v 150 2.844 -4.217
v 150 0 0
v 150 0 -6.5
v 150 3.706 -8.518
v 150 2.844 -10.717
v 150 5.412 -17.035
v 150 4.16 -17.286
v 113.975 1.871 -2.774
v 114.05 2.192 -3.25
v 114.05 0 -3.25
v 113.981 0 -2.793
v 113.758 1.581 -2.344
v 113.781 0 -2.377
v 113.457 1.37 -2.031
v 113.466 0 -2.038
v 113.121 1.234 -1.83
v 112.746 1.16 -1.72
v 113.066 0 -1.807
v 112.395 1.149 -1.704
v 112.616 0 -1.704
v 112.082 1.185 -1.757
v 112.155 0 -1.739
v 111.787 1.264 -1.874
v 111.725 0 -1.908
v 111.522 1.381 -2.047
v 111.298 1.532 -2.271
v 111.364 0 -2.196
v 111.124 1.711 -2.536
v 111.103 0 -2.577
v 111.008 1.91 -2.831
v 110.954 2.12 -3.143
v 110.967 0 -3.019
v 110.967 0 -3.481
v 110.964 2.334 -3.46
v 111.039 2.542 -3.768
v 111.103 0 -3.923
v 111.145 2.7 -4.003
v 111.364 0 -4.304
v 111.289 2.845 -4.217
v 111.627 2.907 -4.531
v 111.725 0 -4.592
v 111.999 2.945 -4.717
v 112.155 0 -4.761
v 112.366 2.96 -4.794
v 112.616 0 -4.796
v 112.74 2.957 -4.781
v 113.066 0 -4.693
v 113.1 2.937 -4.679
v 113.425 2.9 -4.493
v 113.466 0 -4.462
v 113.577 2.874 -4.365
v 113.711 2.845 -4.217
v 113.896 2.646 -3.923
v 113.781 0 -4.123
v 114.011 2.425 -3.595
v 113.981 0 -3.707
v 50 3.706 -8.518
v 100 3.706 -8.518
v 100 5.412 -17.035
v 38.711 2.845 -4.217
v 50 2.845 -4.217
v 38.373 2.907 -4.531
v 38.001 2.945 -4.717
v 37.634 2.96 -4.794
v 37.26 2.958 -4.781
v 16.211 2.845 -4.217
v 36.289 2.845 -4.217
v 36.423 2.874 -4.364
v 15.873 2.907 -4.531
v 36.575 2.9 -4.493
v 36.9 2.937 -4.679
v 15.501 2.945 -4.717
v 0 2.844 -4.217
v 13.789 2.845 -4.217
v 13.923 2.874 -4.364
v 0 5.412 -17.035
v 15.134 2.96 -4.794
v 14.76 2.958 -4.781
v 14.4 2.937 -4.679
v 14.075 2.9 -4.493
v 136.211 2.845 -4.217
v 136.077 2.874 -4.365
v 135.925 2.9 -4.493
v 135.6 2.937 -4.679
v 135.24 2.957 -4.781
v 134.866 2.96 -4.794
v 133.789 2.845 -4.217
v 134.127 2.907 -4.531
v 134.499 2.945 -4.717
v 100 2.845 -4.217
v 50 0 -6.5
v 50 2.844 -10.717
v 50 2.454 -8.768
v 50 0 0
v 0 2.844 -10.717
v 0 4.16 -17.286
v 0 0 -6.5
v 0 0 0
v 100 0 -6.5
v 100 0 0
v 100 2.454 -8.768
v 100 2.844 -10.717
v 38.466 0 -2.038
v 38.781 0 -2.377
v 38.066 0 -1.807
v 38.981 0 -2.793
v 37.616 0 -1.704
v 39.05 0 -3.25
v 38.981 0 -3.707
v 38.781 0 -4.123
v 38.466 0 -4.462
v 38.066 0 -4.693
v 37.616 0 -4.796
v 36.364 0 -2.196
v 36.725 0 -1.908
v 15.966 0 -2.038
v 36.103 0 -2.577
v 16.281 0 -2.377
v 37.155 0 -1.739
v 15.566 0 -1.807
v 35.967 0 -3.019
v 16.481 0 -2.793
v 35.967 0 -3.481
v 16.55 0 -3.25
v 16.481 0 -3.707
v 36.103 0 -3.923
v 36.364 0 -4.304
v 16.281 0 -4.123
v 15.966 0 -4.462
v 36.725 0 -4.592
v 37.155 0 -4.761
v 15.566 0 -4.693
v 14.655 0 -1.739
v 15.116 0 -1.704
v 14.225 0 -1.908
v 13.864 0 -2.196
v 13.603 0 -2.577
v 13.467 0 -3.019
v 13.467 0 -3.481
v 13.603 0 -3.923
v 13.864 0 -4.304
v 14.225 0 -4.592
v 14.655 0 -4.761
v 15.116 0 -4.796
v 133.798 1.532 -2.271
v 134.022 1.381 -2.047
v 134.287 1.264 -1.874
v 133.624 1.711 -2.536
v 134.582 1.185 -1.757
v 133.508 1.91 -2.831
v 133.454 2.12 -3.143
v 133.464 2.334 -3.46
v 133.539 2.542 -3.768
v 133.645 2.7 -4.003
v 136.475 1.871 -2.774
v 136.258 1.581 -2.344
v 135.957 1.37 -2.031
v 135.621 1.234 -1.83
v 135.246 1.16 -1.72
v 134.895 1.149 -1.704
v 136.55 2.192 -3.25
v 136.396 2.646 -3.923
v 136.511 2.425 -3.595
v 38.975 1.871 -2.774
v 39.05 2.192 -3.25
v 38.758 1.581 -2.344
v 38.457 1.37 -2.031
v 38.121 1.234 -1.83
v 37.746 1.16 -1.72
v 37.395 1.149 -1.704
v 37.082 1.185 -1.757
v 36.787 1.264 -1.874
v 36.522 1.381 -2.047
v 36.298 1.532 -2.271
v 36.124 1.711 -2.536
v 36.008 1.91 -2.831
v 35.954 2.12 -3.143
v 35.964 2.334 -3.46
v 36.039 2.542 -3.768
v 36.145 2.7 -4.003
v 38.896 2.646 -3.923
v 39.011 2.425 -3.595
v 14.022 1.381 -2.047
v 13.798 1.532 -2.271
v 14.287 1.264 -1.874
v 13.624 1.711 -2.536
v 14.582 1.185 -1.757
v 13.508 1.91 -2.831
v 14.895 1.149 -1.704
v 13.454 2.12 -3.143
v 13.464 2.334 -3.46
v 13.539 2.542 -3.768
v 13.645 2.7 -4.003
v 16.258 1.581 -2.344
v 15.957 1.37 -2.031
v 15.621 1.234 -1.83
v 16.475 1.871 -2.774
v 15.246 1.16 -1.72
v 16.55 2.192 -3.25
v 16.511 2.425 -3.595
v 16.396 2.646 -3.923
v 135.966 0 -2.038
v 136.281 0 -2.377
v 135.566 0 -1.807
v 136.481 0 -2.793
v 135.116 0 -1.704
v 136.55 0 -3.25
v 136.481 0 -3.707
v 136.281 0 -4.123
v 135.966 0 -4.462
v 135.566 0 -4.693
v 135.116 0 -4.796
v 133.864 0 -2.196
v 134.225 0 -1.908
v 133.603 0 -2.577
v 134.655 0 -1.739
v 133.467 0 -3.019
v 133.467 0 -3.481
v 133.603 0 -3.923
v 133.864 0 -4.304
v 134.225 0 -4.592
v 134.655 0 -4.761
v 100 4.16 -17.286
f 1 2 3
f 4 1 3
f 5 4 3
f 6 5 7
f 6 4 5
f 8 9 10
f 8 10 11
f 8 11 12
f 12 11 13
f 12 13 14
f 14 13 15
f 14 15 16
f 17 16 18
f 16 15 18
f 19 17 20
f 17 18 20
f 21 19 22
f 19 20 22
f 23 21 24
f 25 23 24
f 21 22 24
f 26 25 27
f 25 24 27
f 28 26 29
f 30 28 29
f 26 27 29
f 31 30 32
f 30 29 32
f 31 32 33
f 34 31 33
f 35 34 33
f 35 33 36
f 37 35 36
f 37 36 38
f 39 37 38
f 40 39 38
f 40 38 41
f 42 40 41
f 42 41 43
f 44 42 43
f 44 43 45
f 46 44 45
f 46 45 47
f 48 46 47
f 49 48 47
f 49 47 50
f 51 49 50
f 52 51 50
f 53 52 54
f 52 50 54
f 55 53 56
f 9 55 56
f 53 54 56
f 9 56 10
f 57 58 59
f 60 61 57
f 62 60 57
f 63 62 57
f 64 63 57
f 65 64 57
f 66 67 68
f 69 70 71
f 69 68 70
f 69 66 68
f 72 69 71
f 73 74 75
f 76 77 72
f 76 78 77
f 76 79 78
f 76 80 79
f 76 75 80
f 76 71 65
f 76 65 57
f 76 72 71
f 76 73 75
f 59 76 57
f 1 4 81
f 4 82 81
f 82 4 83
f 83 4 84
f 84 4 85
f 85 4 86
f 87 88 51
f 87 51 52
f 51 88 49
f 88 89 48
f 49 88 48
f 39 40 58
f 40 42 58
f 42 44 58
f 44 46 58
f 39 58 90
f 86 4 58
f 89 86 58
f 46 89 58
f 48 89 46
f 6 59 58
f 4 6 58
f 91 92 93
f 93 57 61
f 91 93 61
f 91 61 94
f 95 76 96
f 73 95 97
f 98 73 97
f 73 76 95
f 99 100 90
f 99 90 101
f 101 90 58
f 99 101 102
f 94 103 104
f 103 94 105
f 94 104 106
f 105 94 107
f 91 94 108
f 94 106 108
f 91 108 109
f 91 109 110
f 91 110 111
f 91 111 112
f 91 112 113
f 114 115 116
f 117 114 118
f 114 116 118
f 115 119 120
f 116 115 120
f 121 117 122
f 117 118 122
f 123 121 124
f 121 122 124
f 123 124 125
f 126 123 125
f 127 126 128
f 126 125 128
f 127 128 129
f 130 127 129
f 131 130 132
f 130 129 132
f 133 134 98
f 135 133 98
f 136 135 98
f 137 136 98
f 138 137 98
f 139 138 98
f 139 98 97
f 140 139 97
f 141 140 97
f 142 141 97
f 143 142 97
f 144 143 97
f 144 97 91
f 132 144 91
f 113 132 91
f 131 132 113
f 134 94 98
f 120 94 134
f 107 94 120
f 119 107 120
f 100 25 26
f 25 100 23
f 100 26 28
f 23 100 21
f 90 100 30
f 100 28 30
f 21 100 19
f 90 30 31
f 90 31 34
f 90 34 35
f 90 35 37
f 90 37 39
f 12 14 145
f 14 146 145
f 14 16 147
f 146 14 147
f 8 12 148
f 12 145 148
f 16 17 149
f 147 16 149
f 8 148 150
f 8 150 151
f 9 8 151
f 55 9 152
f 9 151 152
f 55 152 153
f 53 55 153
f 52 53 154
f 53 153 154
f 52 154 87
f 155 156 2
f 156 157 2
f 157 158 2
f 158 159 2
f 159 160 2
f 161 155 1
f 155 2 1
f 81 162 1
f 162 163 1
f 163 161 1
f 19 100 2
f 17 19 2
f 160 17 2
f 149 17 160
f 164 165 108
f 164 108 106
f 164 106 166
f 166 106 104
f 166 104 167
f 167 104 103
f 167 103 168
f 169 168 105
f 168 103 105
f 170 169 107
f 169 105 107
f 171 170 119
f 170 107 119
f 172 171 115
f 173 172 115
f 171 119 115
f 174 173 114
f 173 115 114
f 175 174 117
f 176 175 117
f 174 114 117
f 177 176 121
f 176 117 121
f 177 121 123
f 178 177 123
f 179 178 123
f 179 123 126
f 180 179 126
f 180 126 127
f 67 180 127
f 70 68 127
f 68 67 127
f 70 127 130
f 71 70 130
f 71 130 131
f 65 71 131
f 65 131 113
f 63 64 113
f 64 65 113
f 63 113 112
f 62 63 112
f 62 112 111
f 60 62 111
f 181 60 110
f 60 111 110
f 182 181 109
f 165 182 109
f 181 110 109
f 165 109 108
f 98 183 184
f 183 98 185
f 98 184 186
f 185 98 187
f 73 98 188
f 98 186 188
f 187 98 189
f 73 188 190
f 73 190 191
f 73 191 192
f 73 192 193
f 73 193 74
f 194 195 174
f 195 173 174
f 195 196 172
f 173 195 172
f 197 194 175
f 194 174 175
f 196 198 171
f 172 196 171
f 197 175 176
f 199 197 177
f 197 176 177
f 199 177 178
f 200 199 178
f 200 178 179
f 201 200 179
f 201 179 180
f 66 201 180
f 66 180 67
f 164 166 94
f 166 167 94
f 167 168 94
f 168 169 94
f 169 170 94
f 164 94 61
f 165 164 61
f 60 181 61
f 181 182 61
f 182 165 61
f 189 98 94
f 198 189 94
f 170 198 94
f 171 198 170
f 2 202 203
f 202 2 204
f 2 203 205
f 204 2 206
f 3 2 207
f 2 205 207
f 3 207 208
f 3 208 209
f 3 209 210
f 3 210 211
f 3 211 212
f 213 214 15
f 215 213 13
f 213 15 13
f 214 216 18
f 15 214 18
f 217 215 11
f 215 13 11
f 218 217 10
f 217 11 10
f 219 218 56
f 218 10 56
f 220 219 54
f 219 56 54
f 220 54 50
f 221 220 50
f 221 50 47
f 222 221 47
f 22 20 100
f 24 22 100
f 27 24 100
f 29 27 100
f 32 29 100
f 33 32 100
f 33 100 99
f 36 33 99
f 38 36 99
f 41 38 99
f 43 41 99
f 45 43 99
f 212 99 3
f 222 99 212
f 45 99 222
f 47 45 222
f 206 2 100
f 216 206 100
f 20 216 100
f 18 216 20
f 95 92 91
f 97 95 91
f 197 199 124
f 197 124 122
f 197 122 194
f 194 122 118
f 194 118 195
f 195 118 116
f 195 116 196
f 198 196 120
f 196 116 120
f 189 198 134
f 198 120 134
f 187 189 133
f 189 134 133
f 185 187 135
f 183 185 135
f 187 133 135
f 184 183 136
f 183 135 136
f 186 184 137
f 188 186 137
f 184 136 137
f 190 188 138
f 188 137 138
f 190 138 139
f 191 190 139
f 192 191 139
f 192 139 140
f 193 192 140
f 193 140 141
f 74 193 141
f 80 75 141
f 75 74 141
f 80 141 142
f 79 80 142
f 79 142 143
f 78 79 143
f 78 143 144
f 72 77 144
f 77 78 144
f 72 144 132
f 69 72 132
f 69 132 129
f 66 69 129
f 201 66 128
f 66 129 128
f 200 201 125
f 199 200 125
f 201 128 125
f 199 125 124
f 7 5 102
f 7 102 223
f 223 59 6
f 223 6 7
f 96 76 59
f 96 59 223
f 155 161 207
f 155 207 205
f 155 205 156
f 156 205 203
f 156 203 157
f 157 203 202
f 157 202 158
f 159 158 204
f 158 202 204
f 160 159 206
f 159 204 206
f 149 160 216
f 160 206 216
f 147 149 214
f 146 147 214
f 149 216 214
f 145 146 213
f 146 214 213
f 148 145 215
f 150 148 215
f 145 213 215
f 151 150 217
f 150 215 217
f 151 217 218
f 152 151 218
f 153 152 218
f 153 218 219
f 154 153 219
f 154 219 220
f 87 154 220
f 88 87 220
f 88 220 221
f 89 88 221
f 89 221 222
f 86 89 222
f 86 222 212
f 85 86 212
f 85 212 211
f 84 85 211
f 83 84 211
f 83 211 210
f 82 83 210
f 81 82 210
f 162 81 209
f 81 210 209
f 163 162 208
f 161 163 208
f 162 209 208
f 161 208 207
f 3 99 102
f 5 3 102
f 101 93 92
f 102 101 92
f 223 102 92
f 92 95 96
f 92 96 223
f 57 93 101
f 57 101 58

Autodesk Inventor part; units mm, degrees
ref_plane "YZ Plane" through (0, 0, 0) normal (1, 0, 0) x (0, 1, 0)
ref_plane "XZ Plane" through (0, 0, 0) normal (0, 1, 0) x (-1, 0, 0)
ref_plane "XY Plane" through (0, 0, 0) normal (0, 0, 1) x (1, 0, 0)
sketch "Sketch1" plane through (0, 0, 0) normal (1, 0, 0) x (0, 1, 0)
  line L0 (0, 0) -> (0, -6.5)
  line L1 (0, -6.5) -> (2, -6.5)
  line L2 (2, -6.5) -> (4.16, -17.286)
  line L3 (0, 0) -> (2, 0)
  line L4 (2, 0) -> (5.4115, -17.0354)
  line L5 (5.4115, -17.0354) -> (4.16, -17.286)
  dimension "d0" = 6.5
  dimension "d1" = 2
  dimension "d2" = 10.786
  dimension "d3" = 2.16
extrude "Extrusion1" add sketch "Sketch1" along normal blind 50
sketch "Sketch2" plane through (50, 0, 0) normal (1, 0, 0) x (0, 0, -1)
  line L0 (0, 0) -> (6.5, 0) projected
  line L1 (6.5, 0) -> (6.5, 2) projected
  line L2 (6.5, 2) -> (17.286, 4.16) projected
  line L3 (17.286, 4.16) -> (17.0354, 5.4115) projected
  line L4 (17.0354, 5.4115) -> (0, 2) projected
  line L5 (0, 2) -> (0, 0) projected
  line L6 (8.7683, 2.4543) -> (8.5177, 3.7057)
extrude "Extrusion2" add sketch "Sketch2" along normal blind 50 contours L4 L3 L2 L6
sketch "Sketch3" plane through (100, 0, 0) normal (1, 0, 0) x (0, 0, -1)
  line L0 (8.7683, 2.4543) -> (8.5177, 3.7057) projected
  line L1 (8.5177, 3.7057) -> (0, 2) projected
  line L2 (0, 2) -> (0, 0) projected
  line L3 (0, 0) -> (6.5, 0) projected
  line L4 (6.5, 0) -> (6.5, 2) projected
  line L5 (6.5, 2) -> (8.7683, 2.4543) projected
  line L6 (17.0354, 5.4115) -> (8.5177, 3.7057) projected
  line L7 (8.5177, 3.7057) -> (8.7683, 2.4543) projected
  line L8 (8.7683, 2.4543) -> (17.286, 4.16) projected
  line L9 (17.286, 4.16) -> (17.0354, 5.4115) projected
extrude "Extrusion3" add sketch "Sketch3" along normal blind 50
sketch "Sketch4" plane through (100, 0, -6.5) normal (0, -1, 0) x (1, 0, 0)
  circle A0 centre (-85, 3.25) radius 1.55
  circle A1 centre (-62.5, 3.25) radius 1.55
  line L0 (-100, 6.5) -> (-100, 0) projected
  line L1 (-100, 6.5) -> (-50, 6.5) projected
  circle A2 centre (35, 3.25) radius 1.55
  circle A3 centre (12.5, 3.25) radius 1.55
  line L2 (0, 6.5) -> (50, 6.5) projected
  line L3 (50, 6.5) -> (50, 0) projected
  point P0 (-100, 3.25)
  dimension "d10" = 37.5
  dimension "d11" = 15
  dimension "d12" = 3.25
  dimension "d13" = 3.1
  dimension "d14" = 3.25
  dimension "d15" = 3.1
  dimension "d16" = 3.1
  dimension "d17" = 3.1
  dimension "d18" = 3.25
  dimension "d19" = 3.25
  dimension "d20" = 15
  dimension "d21" = 37.5
extrude "Extrusion4" cut sketch "Sketch4" against normal blind 3
sketch "Sketch5" plane through (150, 0, 0) normal (1, 0, 0) x (0, 0, -1)
  line L0 (0, 0) -> (13.9221, 9.3906)
  line L1 (0, 0) -> (16.7931, 0) construction
  line L2 (0, 0) -> (4.2172, 2.8445)
  line L3 (1.7, 2.3404) -> (4.8, 2.9612) projected
  line L4 (17.0354, 5.4115) -> (0, 2) projected
  line L5 (0, 2) -> (4.2172, 2.8445)
  line L6 (0, 2) -> (0, 0)
  dimension "d24" = 34
extrude "Extrusion5" cut sketch "Sketch5" against normal blind 150
sketch "Sketch6" plane through (150, 0, 0) normal (1, 0, 0) x (0, 0, -1)
  line L0 (0, 0) -> (6.5, 0) projected
  line L1 (6.5, 0) -> (10.7172, 2.8445)
  line L2 (6.5, 2) -> (8.7683, 2.4543) projected
  line L3 (4.2172, 2.8445) -> (0, 0) projected
  line L4 (6.5, 0) -> (6.5, 2)
  line L5 (10.7172, 2.8445) -> (6.5, 2)
extrude "Extrusion6" add sketch "Sketch6" against normal blind 50
sketch "Sketch7" plane through (0, 0, 0) normal (-1, 0, 0) x (0, 0, 1)
  line L0 (0, 0) -> (-4.2172, 2.8445) projected
  line L1 (-8.5177, 3.7057) -> (-4.2172, 2.8445) projected
  line L2 (-8.5177, 3.7057) -> (-8.7683, 2.4543) projected
  line L3 (-10.7172, 2.8445) -> (-8.7683, 2.4543) projected
  line L4 (-10.7172, 2.8445) -> (-6.5, 0) projected
  line L5 (0, 0) -> (-6.5, 0) projected
  line L6 (-6.5, 2) -> (-17.286, 4.16) projected
  line L7 (-6.5, 0) -> (-6.5, 2) projected
  line L8 (-10.7172, 2.8445) -> (-6.5, 0) projected
extrude "Extrusion7" add sketch "Sketch7" against normal blind 50 contours L4 L3 L6 L7
properties part number "przod"
